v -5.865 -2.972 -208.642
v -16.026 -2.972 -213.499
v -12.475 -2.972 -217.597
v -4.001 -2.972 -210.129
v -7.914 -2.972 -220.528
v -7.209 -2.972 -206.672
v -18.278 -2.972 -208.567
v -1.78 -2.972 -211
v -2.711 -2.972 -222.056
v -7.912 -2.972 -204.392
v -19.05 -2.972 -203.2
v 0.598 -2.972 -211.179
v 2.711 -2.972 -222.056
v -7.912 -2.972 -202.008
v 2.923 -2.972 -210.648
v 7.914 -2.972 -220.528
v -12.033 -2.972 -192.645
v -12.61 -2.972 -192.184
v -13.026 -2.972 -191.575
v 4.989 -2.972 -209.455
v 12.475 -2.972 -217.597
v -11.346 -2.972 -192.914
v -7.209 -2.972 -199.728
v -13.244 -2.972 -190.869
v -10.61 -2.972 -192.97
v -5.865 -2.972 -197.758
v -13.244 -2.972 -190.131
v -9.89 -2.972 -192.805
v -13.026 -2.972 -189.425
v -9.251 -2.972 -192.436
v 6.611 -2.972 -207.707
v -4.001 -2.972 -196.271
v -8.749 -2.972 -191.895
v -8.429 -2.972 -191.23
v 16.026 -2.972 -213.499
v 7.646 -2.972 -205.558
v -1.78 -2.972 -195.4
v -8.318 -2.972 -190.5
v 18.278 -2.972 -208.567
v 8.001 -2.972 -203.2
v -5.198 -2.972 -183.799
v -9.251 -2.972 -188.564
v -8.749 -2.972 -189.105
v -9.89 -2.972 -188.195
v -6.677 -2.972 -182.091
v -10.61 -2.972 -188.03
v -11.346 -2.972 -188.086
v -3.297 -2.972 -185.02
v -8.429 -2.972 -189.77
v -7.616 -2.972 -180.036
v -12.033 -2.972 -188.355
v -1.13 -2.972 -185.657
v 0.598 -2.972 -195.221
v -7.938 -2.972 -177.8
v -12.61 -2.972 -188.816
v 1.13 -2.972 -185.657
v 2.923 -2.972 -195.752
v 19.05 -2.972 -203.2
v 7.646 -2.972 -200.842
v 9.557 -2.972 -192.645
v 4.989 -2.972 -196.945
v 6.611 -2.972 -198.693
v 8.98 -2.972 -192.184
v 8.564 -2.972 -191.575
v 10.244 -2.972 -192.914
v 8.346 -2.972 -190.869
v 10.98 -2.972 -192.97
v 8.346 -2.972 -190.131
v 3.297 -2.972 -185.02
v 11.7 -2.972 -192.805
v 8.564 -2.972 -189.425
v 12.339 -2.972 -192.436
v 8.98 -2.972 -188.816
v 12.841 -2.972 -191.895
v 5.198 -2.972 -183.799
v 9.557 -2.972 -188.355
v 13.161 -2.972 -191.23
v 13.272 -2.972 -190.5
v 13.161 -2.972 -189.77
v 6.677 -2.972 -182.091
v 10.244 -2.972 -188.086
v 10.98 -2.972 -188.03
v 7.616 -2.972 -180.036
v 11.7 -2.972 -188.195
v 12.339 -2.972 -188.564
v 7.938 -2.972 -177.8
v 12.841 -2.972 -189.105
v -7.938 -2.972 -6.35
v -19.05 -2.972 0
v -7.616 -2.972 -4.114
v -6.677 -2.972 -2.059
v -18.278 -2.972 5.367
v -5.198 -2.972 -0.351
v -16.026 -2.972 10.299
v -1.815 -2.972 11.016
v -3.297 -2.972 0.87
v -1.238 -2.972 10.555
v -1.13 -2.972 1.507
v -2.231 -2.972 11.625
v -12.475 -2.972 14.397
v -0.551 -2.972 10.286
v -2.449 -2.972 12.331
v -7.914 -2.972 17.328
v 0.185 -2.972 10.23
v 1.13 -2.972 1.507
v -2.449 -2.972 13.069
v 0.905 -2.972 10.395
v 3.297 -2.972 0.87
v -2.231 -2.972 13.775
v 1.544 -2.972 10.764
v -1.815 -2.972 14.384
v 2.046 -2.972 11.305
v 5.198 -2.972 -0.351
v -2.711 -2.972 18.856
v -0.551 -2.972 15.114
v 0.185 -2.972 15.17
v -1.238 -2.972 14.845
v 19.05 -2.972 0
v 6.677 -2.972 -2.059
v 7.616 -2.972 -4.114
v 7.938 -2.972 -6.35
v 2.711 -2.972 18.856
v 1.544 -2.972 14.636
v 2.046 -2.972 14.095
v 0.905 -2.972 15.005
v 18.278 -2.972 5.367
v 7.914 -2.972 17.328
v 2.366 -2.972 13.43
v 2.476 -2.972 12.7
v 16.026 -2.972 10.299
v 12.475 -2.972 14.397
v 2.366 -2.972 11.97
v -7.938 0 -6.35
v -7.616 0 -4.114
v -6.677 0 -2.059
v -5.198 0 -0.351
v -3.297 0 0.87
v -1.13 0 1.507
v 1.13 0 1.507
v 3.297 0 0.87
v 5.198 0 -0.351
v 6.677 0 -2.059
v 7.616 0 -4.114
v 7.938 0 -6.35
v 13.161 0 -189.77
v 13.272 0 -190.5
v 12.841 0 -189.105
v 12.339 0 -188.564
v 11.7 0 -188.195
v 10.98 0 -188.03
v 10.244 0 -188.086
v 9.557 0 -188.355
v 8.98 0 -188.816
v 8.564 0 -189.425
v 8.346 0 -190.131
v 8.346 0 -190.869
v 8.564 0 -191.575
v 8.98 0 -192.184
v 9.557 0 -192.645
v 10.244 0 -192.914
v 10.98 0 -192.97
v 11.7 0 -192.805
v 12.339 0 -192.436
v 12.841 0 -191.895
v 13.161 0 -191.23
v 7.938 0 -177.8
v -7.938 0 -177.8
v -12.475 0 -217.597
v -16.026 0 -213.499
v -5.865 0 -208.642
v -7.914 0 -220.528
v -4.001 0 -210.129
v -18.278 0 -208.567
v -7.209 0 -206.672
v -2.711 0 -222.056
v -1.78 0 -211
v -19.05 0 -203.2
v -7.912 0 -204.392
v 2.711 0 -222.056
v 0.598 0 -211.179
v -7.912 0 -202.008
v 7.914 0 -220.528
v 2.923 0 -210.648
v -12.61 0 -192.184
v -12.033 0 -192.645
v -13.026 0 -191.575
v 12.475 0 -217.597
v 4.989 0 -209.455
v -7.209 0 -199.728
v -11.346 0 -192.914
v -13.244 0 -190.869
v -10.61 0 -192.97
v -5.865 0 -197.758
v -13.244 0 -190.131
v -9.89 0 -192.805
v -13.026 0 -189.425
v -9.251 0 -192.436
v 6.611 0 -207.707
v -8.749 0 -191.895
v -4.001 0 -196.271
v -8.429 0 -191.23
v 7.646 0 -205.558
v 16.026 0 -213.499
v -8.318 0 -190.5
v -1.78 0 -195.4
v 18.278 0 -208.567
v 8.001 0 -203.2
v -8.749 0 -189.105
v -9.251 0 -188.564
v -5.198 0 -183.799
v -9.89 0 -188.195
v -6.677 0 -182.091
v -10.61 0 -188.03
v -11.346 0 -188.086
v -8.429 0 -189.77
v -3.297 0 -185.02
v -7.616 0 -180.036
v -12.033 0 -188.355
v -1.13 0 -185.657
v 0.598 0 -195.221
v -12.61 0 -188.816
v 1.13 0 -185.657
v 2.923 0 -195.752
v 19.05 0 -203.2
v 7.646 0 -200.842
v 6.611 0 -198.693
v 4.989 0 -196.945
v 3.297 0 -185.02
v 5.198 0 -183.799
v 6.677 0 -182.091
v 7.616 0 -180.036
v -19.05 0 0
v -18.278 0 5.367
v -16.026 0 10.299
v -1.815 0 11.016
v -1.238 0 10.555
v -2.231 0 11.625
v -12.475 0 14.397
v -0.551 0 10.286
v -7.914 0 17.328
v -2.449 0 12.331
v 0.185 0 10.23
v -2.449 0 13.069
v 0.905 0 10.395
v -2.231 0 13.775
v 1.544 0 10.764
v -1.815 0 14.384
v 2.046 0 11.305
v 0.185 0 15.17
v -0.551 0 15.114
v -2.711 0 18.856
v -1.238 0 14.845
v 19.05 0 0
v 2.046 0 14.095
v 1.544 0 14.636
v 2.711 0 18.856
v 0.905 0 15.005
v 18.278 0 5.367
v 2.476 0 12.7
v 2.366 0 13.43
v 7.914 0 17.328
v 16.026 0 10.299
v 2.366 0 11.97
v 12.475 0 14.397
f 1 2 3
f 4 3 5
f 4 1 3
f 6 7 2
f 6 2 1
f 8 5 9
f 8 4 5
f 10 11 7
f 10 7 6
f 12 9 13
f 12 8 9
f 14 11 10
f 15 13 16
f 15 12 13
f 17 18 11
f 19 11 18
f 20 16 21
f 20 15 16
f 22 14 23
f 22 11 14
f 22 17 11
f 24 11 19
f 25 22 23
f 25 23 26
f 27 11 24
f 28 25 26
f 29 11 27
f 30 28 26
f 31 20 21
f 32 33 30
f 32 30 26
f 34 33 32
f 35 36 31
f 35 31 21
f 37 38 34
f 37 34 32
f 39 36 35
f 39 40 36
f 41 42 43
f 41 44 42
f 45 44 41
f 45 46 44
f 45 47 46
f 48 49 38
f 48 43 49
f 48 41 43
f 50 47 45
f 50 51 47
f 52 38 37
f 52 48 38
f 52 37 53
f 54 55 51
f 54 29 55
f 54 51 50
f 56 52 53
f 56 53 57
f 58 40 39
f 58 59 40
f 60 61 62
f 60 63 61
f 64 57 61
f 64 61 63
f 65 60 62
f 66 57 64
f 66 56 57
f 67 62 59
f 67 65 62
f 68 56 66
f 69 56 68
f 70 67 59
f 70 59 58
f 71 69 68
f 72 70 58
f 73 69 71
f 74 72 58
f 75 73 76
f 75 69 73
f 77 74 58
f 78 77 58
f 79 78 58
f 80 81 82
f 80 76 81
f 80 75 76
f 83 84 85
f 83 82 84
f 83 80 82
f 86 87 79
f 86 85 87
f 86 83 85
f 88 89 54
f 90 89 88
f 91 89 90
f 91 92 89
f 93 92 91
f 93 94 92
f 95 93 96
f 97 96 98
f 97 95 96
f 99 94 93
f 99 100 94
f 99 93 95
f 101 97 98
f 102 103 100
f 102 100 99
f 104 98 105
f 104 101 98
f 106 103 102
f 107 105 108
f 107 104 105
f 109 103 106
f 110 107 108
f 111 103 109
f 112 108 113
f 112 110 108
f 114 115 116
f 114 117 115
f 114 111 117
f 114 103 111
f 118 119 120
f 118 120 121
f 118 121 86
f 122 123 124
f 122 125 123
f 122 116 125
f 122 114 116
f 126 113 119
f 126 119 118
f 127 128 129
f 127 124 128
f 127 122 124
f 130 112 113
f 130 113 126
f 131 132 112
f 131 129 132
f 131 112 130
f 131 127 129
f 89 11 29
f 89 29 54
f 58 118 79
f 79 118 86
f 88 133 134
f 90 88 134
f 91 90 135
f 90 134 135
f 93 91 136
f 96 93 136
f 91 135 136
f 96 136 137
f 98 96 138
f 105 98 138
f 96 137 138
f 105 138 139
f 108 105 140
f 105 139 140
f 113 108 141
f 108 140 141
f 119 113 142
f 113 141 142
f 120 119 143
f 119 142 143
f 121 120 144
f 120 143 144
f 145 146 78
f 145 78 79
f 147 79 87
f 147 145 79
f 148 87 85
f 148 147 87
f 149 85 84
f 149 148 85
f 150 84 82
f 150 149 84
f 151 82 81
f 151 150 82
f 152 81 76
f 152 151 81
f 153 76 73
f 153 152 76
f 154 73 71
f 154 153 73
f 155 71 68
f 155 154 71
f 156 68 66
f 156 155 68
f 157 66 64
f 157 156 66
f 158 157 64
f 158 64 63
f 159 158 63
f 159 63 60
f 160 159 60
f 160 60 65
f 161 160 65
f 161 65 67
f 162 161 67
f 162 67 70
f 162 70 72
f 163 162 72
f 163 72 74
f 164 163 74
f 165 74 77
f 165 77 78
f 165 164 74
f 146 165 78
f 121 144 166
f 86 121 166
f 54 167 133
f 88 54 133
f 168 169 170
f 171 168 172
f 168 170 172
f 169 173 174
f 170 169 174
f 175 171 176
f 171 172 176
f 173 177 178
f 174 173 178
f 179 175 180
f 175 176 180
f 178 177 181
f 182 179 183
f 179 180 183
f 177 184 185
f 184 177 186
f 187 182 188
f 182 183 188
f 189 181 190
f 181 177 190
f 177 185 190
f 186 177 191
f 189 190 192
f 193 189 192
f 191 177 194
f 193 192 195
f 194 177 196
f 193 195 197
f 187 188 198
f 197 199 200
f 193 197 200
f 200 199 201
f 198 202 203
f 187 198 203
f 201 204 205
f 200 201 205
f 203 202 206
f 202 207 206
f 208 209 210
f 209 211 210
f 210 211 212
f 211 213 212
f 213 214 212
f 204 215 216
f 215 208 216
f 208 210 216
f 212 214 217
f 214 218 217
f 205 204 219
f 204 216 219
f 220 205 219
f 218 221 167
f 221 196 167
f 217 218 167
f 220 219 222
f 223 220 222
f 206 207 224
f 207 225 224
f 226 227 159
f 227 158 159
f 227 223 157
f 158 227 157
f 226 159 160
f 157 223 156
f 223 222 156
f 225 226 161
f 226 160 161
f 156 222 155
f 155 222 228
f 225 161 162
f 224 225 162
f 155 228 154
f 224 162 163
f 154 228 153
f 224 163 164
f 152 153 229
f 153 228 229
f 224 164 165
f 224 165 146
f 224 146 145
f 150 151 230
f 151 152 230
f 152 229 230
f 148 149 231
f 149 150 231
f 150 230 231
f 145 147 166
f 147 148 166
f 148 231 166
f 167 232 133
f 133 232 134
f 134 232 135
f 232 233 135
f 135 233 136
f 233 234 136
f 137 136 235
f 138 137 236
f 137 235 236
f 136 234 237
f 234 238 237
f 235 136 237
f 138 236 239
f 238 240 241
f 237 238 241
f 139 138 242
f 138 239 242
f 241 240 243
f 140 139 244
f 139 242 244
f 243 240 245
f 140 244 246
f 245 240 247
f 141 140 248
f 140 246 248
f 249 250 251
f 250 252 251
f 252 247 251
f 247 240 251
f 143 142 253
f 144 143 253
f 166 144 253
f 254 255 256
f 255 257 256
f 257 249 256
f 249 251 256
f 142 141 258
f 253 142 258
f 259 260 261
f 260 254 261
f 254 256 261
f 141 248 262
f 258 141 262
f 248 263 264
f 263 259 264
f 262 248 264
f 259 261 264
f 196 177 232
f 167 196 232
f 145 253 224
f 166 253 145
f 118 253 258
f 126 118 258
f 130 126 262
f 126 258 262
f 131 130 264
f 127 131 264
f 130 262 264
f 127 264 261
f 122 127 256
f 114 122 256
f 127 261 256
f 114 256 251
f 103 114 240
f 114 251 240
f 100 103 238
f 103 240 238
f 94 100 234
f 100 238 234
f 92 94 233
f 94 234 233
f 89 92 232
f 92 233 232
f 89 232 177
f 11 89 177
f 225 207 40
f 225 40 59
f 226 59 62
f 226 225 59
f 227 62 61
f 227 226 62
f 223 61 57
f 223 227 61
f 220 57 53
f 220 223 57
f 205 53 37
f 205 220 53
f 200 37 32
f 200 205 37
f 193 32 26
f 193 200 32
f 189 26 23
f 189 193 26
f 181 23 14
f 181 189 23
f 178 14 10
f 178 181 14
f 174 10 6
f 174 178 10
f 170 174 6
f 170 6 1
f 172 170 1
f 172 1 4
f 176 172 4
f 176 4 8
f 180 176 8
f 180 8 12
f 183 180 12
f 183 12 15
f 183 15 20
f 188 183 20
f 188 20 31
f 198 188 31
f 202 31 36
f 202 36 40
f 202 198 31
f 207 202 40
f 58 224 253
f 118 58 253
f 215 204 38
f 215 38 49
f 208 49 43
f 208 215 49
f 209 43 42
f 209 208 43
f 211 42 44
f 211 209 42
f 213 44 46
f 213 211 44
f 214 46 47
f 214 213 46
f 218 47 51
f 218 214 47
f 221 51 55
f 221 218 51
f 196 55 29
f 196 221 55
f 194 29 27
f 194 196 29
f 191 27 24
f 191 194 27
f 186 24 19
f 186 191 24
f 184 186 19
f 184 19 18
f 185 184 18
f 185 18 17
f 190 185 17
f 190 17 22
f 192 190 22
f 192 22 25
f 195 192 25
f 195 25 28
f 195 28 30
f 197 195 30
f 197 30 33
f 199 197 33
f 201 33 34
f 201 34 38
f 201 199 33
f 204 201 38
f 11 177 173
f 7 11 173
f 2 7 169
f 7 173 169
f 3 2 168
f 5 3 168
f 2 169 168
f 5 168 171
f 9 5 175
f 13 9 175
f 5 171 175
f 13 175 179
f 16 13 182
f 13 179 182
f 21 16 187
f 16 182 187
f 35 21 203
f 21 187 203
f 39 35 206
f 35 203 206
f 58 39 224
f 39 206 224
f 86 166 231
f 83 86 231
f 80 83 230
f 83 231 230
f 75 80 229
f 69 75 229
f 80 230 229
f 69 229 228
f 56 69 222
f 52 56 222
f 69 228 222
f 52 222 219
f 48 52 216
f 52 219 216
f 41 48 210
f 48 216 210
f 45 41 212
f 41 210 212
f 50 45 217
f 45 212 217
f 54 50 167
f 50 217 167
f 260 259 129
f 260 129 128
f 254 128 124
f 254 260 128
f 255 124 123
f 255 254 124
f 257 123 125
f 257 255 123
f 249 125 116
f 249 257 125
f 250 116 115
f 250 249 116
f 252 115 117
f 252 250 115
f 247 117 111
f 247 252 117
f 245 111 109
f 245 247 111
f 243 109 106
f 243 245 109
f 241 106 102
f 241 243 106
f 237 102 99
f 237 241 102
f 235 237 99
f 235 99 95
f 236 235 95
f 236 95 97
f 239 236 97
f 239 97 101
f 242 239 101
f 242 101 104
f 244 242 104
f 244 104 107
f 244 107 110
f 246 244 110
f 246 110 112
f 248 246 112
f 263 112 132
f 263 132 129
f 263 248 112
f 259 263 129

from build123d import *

# Parameters (mm, degrees)
F0_R     = 2.4765
F0_R_2   = 8.001
F1_DEPTH = 2.9718


with BuildPart() as f1:
    # F0 (on Front) → F1 (new body)
    with BuildSketch(Plane.XZ):
        with BuildLine():
            Line((-19.05, 0), (-19.05, -203.2))
            ThreePointArc((-19.05, -203.2), (0, -222.25), (19.05, -203.2))
            Line((19.05, -203.2), (19.05, 0))
            ThreePointArc((19.05, 0), (0, 19.05), (-19.05, 0))
        make_face()
        with Locations((-10.795, -190.5)):
            Circle(F0_R, mode=Mode.SUBTRACT)
        with Locations((0, -203.2)):
            Circle(F0_R_2, mode=Mode.SUBTRACT)
        with Locations((10.795, -190.5)):
            Circle(F0_R, mode=Mode.SUBTRACT)
        with BuildLine():
            ThreePointArc((7.9375, -177.8), (0, -185.7375), (-7.9375, -177.8))
            Line((-7.9375, -177.8), (-7.9375, -6.35))
            ThreePointArc((-7.9375, -6.35), (0, 1.5875), (7.9375, -6.35))
            Line((7.9375, -6.35), (7.9375, -177.8))
        make_face(mode=Mode.SUBTRACT)
        with Locations((0, 12.7)):
            Circle(F0_R, mode=Mode.SUBTRACT)
    extrude(amount=F1_DEPTH)


solid = f1.part
